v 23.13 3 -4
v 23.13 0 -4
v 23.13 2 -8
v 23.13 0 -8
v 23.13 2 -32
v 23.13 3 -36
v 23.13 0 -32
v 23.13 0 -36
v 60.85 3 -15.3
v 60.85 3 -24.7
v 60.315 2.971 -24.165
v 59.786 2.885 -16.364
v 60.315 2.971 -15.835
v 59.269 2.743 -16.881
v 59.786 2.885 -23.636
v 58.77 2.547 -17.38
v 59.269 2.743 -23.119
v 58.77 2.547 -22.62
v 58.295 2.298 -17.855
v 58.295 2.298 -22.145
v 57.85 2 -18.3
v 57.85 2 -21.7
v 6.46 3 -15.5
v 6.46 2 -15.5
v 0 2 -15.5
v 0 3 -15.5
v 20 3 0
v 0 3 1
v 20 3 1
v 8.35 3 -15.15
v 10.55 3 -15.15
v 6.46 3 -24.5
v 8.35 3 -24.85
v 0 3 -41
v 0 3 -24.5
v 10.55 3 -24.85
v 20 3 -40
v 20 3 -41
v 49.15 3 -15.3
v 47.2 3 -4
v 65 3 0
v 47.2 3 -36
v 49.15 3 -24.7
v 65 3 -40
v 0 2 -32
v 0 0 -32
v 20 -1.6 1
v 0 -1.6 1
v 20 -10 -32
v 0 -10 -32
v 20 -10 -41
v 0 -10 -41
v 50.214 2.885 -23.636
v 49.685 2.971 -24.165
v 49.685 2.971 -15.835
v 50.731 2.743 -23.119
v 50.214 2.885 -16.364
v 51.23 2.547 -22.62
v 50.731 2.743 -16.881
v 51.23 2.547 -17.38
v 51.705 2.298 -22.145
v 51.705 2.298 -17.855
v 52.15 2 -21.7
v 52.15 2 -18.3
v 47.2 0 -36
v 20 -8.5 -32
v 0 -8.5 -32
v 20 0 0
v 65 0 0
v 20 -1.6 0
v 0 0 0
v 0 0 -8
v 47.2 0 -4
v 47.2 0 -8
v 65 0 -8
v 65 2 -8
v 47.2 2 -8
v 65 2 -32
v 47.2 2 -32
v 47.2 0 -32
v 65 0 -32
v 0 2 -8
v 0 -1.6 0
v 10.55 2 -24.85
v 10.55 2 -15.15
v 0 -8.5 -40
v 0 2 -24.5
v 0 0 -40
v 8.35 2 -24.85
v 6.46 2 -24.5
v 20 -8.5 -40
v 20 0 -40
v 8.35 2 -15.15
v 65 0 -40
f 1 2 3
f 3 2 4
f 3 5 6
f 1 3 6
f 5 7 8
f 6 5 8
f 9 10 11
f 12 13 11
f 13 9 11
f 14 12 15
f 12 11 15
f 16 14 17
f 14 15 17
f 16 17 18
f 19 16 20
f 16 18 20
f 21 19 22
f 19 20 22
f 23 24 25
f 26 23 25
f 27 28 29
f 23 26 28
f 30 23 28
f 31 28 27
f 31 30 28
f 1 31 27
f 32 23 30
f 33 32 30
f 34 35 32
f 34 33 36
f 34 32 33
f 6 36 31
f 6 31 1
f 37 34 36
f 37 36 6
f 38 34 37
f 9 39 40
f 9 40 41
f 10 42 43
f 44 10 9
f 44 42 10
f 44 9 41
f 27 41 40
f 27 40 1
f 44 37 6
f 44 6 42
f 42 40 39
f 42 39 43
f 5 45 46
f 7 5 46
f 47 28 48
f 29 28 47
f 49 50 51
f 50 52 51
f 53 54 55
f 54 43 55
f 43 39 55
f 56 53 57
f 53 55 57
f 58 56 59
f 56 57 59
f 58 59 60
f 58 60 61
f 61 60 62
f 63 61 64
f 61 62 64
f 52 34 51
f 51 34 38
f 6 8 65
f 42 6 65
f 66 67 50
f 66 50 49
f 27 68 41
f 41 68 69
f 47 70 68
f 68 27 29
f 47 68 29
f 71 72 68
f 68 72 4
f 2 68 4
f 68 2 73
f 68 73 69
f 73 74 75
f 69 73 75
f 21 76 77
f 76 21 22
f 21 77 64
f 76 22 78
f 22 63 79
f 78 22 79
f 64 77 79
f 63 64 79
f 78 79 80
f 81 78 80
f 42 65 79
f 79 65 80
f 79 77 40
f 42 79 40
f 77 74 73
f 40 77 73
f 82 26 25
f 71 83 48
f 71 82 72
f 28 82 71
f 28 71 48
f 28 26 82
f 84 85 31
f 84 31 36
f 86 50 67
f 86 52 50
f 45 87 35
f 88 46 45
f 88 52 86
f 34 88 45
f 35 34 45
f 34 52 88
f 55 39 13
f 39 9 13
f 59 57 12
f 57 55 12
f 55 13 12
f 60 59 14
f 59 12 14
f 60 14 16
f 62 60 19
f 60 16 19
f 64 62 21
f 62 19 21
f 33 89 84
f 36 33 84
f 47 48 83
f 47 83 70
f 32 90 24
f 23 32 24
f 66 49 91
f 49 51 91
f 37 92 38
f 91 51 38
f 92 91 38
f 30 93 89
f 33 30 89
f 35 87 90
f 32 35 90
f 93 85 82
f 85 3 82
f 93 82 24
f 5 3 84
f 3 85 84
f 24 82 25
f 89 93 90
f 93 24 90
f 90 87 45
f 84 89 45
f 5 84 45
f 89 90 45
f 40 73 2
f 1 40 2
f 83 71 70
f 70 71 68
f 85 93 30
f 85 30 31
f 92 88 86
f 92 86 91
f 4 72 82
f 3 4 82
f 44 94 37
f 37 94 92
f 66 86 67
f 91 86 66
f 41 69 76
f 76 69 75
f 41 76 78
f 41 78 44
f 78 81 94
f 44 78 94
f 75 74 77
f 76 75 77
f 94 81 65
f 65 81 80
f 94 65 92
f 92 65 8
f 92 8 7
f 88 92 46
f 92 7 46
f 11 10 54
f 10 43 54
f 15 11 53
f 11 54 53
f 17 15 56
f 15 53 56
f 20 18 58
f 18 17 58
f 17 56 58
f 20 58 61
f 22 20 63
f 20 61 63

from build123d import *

# Parameters (mm, degrees)
SKETCH1_W               = 2.2
SKETCH1_H               = 9.7
SKETCH1_W_2             = 5.7
SKETCH1_H_2             = 3.4
BOSS_EXTRUDE2_DEPTH     = 3
CUT_EXTRUDE2_DEPTH      = 58.983591645
CUT_EXTRUDE2_DEPTH_BACK = 58.983591645
FILLET1_R               = 5
SKETCH4_W               = 20
SKETCH4_H               = 3
BOSS_EXTRUDE3_DEPTH     = 1
SKETCH5_W               = 20
SKETCH5_H               = 1
BOSS_EXTRUDE4_DEPTH     = 10
SKETCH6_W               = 20
SKETCH6_H               = 1.5
BOSS_EXTRUDE5_DEPTH     = 8
SKETCH7_W               = 20
SKETCH7_H               = 3
BOSS_EXTRUDE6_DEPTH     = 1
SKETCH8_W               = 20
SKETCH8_H               = 1
BOSS_EXTRUDE7_DEPTH     = 1.6


with BuildPart() as part:
    # Sketch1 → Boss-Extrude2 (new body)
    with BuildSketch(Plane(origin=(0, 0, 0), x_dir=(1, 0, 0), z_dir=(0, 1, 0))):
        Polygon((0, 15.5), (0, 0), (65, 0), (65, 40), (0, 40), (0, 24.5), (6.46, 24.5), (6.46, 15.5), align=None)
        with Locations((9.45, 20)):
            Rectangle(SKETCH1_W, SKETCH1_H, mode=Mode.SUBTRACT)
        with Locations((55, 20)):
            Rectangle(SKETCH1_W_2, SKETCH1_H_2, mode=Mode.SUBTRACT)
        Polygon((23.13, 11), (23.13, 29), (23.13, 36), (47.2, 36), (47.2, 29), (47.2, 11), (47.2, 4), (23.13, 4), align=None, mode=Mode.SUBTRACT)
    extrude(amount=BOSS_EXTRUDE2_DEPTH)

    # Sketch3 → Cut-Extrude2 (cut, two sides: drawn at the far end of the back side and taken through both)
    with BuildSketch(Plane(origin=(23.13, 0, 0), x_dir=(0, 0, -1), z_dir=(1, 0, 0)).offset(-CUT_EXTRUDE2_DEPTH_BACK)):
        Polygon((11, -0.008080614), (8, 0), (8, 2), (32, 2), (32, 0), align=None)
    extrude(amount=CUT_EXTRUDE2_DEPTH + CUT_EXTRUDE2_DEPTH_BACK, mode=Mode.SUBTRACT)

    # Fillet1
    # the kernel refuses this fillet: 5 mm, written as the material it takes off along each edge
    with BuildSketch(Plane(origin=(57.85, 3, -18.3), x_dir=(0, 0, 1), z_dir=(-1, 0, 0)), Plane(origin=(52.15, 3, -21.7), x_dir=(0, 0, -1), z_dir=(1, 0, 0))) as fillet1_piece_1:
        with BuildLine():
            CenterArc((3, -5), FILLET1_R, 90, 36.869897646)
            Line((0, -1), (0, 0))
            Line((0, 0), (3, 0))
        make_face()
    extrude(amount=5.7, mode=Mode.SUBTRACT)
    with BuildSketch(Plane(origin=(57.85, 3, -21.7), x_dir=(1, 0, 0), z_dir=(0, 0, 1)), Plane(origin=(52.15, 3, -18.3), x_dir=(-1, 0, 0), z_dir=(0, 0, -1))) as fillet1_piece_2:
        with BuildLine():
            CenterArc((3, -5), FILLET1_R, 90, 36.869897646)
            Line((0, -1), (0, 0))
            Line((0, 0), (3, 0))
        make_face()
    extrude(amount=3.4, mode=Mode.SUBTRACT)
    with BuildSketch(Plane(origin=(65.35, 3, -18.3), x_dir=(0, 0, 1), z_dir=(-1, 0, 0))) as fillet1_piece_3a_section:
        with BuildLine():
            CenterArc((3, -5), FILLET1_R, 90, 36.869897646)
            Line((0, -1), (0, 0))
            Line((0, 0), (3, 0))
        make_face()
    fillet1_piece_3a = extrude(amount=13.2, mode=Mode.PRIVATE)
    fillet1_piece_3a = split(fillet1_piece_3a, bisect_by=Plane(origin=(65, 3, -18.3), z_dir=(-1, 0, 0)), keep=Keep.TOP, mode=Mode.PRIVATE)
    fillet1_piece_3a = split(fillet1_piece_3a, bisect_by=Plane(origin=(57.85, 3, -18.3), z_dir=(1, 0, 0)), keep=Keep.TOP, mode=Mode.PRIVATE)
    with BuildSketch(Plane(origin=(57.85, 3, -21.7), x_dir=(1, 0, 0), z_dir=(0, 0, 1))) as fillet1_piece_3b_section:
        with BuildLine():
            CenterArc((3, -5), FILLET1_R, 90, 36.869897646)
            Line((0, -1), (0, 0))
            Line((0, 0), (3, 0))
        make_face()
    fillet1_piece_3b = extrude(amount=10.9, mode=Mode.PRIVATE)
    fillet1_piece_3b = split(fillet1_piece_3b, bisect_by=Plane(origin=(57.85, 3, -18.3), z_dir=(0, 0, 1)), keep=Keep.TOP, mode=Mode.PRIVATE)
    fillet1_piece_3 = fillet1_piece_3a & fillet1_piece_3b
    add(fillet1_piece_3, mode=Mode.SUBTRACT)
    with BuildSketch(Plane(origin=(57.85, 3, -18.3), x_dir=(0, 0, 1), z_dir=(-1, 0, 0))) as fillet1_piece_4a_section:
        with BuildLine():
            CenterArc((3, -5), FILLET1_R, 90, 36.869897646)
            Line((0, -1), (0, 0))
            Line((0, 0), (3, 0))
        make_face()
    fillet1_piece_4a = extrude(amount=13.2, mode=Mode.PRIVATE)
    fillet1_piece_4a = split(fillet1_piece_4a, bisect_by=Plane(origin=(47.2, 3, -18.3), z_dir=(1, 0, 0)), keep=Keep.TOP, mode=Mode.PRIVATE)
    fillet1_piece_4a = split(fillet1_piece_4a, bisect_by=Plane(origin=(52.15, 3, -18.3), z_dir=(-1, 0, 0)), keep=Keep.TOP, mode=Mode.PRIVATE)
    with BuildSketch(Plane(origin=(52.15, 3, -10.8), x_dir=(-1, 0, 0), z_dir=(0, 0, -1))) as fillet1_piece_4b_section:
        with BuildLine():
            CenterArc((3, -5), FILLET1_R, 90, 36.869897646)
            Line((0, -1), (0, 0))
            Line((0, 0), (3, 0))
        make_face()
    fillet1_piece_4b = extrude(amount=10.9, mode=Mode.PRIVATE)
    fillet1_piece_4b = split(fillet1_piece_4b, bisect_by=Plane(origin=(52.15, 3, -18.3), z_dir=(0, 0, 1)), keep=Keep.TOP, mode=Mode.PRIVATE)
    fillet1_piece_4 = fillet1_piece_4a & fillet1_piece_4b
    add(fillet1_piece_4, mode=Mode.SUBTRACT)
    with BuildSketch(Plane(origin=(52.15, 3, -21.7), x_dir=(0, 0, -1), z_dir=(1, 0, 0))) as fillet1_piece_5a_section:
        with BuildLine():
            CenterArc((3, -5), FILLET1_R, 90, 36.869897646)
            Line((0, -1), (0, 0))
            Line((0, 0), (3, 0))
        make_face()
    fillet1_piece_5a = extrude(amount=13.2, mode=Mode.PRIVATE)
    fillet1_piece_5a = split(fillet1_piece_5a, bisect_by=Plane(origin=(65, 3, -21.7), z_dir=(-1, 0, 0)), keep=Keep.TOP, mode=Mode.PRIVATE)
    fillet1_piece_5a = split(fillet1_piece_5a, bisect_by=Plane(origin=(57.85, 3, -21.7), z_dir=(1, 0, 0)), keep=Keep.TOP, mode=Mode.PRIVATE)
    with BuildSketch(Plane(origin=(57.85, 3, -29.2), x_dir=(1, 0, 0), z_dir=(0, 0, 1))) as fillet1_piece_5b_section:
        with BuildLine():
            CenterArc((3, -5), FILLET1_R, 90, 36.869897646)
            Line((0, -1), (0, 0))
            Line((0, 0), (3, 0))
        make_face()
    fillet1_piece_5b = extrude(amount=10.9, mode=Mode.PRIVATE)
    fillet1_piece_5b = split(fillet1_piece_5b, bisect_by=Plane(origin=(57.85, 3, -21.7), z_dir=(0, 0, -1)), keep=Keep.TOP, mode=Mode.PRIVATE)
    fillet1_piece_5 = fillet1_piece_5a & fillet1_piece_5b
    add(fillet1_piece_5, mode=Mode.SUBTRACT)
    with BuildSketch(Plane(origin=(52.15, 3, -18.3), x_dir=(-1, 0, 0), z_dir=(0, 0, -1))) as fillet1_piece_6a_section:
        with BuildLine():
            CenterArc((3, -5), FILLET1_R, 90, 36.869897646)
            Line((0, -1), (0, 0))
            Line((0, 0), (3, 0))
        make_face()
    fillet1_piece_6a = extrude(amount=10.9, mode=Mode.PRIVATE)
    fillet1_piece_6a = split(fillet1_piece_6a, bisect_by=Plane(origin=(52.15, 3, -21.7), z_dir=(0, 0, -1)), keep=Keep.TOP, mode=Mode.PRIVATE)
    with BuildSketch(Plane(origin=(44.65, 3, -21.7), x_dir=(0, 0, -1), z_dir=(1, 0, 0))) as fillet1_piece_6b_section:
        with BuildLine():
            CenterArc((3, -5), FILLET1_R, 90, 36.869897646)
            Line((0, -1), (0, 0))
            Line((0, 0), (3, 0))
        make_face()
    fillet1_piece_6b = extrude(amount=13.2, mode=Mode.PRIVATE)
    fillet1_piece_6b = split(fillet1_piece_6b, bisect_by=Plane(origin=(47.2, 3, -21.7), z_dir=(1, 0, 0)), keep=Keep.TOP, mode=Mode.PRIVATE)
    fillet1_piece_6b = split(fillet1_piece_6b, bisect_by=Plane(origin=(52.15, 3, -21.7), z_dir=(-1, 0, 0)), keep=Keep.TOP, mode=Mode.PRIVATE)
    fillet1_piece_6 = fillet1_piece_6a & fillet1_piece_6b
    add(fillet1_piece_6, mode=Mode.SUBTRACT)

    # Sketch4 → Boss-Extrude3 (add)
    with BuildSketch(Plane(origin=(0, 0, -40), x_dir=(-1, 0, 0), z_dir=(0, 0, -1))):
        with Locations((-10, 1.5)):
            Rectangle(SKETCH4_W, SKETCH4_H)
    extrude(amount=BOSS_EXTRUDE3_DEPTH)

    # Sketch5 → Boss-Extrude4 (add)
    with BuildSketch(Plane.XZ):
        with Locations((10, -40.5)):
            Rectangle(SKETCH5_W, SKETCH5_H)
    extrude(amount=BOSS_EXTRUDE4_DEPTH)

    # Sketch6 → Boss-Extrude5 (add)
    with BuildSketch(Plane.XY.offset(-40)):
        with Locations((10, -9.25)):
            Rectangle(SKETCH6_W, SKETCH6_H)
    extrude(amount=BOSS_EXTRUDE5_DEPTH)

    # Sketch7 → Boss-Extrude6 (add)
    with BuildSketch(Plane.XY):
        with Locations((10, 1.5)):
            Rectangle(SKETCH7_W, SKETCH7_H)
    extrude(amount=BOSS_EXTRUDE6_DEPTH)

    # Sketch8 → Boss-Extrude7 (add)
    with BuildSketch(Plane.XZ):
        with Locations((10, 0.5)):
            Rectangle(SKETCH8_W, SKETCH8_H)
    extrude(amount=BOSS_EXTRUDE7_DEPTH)


solid = part.part
